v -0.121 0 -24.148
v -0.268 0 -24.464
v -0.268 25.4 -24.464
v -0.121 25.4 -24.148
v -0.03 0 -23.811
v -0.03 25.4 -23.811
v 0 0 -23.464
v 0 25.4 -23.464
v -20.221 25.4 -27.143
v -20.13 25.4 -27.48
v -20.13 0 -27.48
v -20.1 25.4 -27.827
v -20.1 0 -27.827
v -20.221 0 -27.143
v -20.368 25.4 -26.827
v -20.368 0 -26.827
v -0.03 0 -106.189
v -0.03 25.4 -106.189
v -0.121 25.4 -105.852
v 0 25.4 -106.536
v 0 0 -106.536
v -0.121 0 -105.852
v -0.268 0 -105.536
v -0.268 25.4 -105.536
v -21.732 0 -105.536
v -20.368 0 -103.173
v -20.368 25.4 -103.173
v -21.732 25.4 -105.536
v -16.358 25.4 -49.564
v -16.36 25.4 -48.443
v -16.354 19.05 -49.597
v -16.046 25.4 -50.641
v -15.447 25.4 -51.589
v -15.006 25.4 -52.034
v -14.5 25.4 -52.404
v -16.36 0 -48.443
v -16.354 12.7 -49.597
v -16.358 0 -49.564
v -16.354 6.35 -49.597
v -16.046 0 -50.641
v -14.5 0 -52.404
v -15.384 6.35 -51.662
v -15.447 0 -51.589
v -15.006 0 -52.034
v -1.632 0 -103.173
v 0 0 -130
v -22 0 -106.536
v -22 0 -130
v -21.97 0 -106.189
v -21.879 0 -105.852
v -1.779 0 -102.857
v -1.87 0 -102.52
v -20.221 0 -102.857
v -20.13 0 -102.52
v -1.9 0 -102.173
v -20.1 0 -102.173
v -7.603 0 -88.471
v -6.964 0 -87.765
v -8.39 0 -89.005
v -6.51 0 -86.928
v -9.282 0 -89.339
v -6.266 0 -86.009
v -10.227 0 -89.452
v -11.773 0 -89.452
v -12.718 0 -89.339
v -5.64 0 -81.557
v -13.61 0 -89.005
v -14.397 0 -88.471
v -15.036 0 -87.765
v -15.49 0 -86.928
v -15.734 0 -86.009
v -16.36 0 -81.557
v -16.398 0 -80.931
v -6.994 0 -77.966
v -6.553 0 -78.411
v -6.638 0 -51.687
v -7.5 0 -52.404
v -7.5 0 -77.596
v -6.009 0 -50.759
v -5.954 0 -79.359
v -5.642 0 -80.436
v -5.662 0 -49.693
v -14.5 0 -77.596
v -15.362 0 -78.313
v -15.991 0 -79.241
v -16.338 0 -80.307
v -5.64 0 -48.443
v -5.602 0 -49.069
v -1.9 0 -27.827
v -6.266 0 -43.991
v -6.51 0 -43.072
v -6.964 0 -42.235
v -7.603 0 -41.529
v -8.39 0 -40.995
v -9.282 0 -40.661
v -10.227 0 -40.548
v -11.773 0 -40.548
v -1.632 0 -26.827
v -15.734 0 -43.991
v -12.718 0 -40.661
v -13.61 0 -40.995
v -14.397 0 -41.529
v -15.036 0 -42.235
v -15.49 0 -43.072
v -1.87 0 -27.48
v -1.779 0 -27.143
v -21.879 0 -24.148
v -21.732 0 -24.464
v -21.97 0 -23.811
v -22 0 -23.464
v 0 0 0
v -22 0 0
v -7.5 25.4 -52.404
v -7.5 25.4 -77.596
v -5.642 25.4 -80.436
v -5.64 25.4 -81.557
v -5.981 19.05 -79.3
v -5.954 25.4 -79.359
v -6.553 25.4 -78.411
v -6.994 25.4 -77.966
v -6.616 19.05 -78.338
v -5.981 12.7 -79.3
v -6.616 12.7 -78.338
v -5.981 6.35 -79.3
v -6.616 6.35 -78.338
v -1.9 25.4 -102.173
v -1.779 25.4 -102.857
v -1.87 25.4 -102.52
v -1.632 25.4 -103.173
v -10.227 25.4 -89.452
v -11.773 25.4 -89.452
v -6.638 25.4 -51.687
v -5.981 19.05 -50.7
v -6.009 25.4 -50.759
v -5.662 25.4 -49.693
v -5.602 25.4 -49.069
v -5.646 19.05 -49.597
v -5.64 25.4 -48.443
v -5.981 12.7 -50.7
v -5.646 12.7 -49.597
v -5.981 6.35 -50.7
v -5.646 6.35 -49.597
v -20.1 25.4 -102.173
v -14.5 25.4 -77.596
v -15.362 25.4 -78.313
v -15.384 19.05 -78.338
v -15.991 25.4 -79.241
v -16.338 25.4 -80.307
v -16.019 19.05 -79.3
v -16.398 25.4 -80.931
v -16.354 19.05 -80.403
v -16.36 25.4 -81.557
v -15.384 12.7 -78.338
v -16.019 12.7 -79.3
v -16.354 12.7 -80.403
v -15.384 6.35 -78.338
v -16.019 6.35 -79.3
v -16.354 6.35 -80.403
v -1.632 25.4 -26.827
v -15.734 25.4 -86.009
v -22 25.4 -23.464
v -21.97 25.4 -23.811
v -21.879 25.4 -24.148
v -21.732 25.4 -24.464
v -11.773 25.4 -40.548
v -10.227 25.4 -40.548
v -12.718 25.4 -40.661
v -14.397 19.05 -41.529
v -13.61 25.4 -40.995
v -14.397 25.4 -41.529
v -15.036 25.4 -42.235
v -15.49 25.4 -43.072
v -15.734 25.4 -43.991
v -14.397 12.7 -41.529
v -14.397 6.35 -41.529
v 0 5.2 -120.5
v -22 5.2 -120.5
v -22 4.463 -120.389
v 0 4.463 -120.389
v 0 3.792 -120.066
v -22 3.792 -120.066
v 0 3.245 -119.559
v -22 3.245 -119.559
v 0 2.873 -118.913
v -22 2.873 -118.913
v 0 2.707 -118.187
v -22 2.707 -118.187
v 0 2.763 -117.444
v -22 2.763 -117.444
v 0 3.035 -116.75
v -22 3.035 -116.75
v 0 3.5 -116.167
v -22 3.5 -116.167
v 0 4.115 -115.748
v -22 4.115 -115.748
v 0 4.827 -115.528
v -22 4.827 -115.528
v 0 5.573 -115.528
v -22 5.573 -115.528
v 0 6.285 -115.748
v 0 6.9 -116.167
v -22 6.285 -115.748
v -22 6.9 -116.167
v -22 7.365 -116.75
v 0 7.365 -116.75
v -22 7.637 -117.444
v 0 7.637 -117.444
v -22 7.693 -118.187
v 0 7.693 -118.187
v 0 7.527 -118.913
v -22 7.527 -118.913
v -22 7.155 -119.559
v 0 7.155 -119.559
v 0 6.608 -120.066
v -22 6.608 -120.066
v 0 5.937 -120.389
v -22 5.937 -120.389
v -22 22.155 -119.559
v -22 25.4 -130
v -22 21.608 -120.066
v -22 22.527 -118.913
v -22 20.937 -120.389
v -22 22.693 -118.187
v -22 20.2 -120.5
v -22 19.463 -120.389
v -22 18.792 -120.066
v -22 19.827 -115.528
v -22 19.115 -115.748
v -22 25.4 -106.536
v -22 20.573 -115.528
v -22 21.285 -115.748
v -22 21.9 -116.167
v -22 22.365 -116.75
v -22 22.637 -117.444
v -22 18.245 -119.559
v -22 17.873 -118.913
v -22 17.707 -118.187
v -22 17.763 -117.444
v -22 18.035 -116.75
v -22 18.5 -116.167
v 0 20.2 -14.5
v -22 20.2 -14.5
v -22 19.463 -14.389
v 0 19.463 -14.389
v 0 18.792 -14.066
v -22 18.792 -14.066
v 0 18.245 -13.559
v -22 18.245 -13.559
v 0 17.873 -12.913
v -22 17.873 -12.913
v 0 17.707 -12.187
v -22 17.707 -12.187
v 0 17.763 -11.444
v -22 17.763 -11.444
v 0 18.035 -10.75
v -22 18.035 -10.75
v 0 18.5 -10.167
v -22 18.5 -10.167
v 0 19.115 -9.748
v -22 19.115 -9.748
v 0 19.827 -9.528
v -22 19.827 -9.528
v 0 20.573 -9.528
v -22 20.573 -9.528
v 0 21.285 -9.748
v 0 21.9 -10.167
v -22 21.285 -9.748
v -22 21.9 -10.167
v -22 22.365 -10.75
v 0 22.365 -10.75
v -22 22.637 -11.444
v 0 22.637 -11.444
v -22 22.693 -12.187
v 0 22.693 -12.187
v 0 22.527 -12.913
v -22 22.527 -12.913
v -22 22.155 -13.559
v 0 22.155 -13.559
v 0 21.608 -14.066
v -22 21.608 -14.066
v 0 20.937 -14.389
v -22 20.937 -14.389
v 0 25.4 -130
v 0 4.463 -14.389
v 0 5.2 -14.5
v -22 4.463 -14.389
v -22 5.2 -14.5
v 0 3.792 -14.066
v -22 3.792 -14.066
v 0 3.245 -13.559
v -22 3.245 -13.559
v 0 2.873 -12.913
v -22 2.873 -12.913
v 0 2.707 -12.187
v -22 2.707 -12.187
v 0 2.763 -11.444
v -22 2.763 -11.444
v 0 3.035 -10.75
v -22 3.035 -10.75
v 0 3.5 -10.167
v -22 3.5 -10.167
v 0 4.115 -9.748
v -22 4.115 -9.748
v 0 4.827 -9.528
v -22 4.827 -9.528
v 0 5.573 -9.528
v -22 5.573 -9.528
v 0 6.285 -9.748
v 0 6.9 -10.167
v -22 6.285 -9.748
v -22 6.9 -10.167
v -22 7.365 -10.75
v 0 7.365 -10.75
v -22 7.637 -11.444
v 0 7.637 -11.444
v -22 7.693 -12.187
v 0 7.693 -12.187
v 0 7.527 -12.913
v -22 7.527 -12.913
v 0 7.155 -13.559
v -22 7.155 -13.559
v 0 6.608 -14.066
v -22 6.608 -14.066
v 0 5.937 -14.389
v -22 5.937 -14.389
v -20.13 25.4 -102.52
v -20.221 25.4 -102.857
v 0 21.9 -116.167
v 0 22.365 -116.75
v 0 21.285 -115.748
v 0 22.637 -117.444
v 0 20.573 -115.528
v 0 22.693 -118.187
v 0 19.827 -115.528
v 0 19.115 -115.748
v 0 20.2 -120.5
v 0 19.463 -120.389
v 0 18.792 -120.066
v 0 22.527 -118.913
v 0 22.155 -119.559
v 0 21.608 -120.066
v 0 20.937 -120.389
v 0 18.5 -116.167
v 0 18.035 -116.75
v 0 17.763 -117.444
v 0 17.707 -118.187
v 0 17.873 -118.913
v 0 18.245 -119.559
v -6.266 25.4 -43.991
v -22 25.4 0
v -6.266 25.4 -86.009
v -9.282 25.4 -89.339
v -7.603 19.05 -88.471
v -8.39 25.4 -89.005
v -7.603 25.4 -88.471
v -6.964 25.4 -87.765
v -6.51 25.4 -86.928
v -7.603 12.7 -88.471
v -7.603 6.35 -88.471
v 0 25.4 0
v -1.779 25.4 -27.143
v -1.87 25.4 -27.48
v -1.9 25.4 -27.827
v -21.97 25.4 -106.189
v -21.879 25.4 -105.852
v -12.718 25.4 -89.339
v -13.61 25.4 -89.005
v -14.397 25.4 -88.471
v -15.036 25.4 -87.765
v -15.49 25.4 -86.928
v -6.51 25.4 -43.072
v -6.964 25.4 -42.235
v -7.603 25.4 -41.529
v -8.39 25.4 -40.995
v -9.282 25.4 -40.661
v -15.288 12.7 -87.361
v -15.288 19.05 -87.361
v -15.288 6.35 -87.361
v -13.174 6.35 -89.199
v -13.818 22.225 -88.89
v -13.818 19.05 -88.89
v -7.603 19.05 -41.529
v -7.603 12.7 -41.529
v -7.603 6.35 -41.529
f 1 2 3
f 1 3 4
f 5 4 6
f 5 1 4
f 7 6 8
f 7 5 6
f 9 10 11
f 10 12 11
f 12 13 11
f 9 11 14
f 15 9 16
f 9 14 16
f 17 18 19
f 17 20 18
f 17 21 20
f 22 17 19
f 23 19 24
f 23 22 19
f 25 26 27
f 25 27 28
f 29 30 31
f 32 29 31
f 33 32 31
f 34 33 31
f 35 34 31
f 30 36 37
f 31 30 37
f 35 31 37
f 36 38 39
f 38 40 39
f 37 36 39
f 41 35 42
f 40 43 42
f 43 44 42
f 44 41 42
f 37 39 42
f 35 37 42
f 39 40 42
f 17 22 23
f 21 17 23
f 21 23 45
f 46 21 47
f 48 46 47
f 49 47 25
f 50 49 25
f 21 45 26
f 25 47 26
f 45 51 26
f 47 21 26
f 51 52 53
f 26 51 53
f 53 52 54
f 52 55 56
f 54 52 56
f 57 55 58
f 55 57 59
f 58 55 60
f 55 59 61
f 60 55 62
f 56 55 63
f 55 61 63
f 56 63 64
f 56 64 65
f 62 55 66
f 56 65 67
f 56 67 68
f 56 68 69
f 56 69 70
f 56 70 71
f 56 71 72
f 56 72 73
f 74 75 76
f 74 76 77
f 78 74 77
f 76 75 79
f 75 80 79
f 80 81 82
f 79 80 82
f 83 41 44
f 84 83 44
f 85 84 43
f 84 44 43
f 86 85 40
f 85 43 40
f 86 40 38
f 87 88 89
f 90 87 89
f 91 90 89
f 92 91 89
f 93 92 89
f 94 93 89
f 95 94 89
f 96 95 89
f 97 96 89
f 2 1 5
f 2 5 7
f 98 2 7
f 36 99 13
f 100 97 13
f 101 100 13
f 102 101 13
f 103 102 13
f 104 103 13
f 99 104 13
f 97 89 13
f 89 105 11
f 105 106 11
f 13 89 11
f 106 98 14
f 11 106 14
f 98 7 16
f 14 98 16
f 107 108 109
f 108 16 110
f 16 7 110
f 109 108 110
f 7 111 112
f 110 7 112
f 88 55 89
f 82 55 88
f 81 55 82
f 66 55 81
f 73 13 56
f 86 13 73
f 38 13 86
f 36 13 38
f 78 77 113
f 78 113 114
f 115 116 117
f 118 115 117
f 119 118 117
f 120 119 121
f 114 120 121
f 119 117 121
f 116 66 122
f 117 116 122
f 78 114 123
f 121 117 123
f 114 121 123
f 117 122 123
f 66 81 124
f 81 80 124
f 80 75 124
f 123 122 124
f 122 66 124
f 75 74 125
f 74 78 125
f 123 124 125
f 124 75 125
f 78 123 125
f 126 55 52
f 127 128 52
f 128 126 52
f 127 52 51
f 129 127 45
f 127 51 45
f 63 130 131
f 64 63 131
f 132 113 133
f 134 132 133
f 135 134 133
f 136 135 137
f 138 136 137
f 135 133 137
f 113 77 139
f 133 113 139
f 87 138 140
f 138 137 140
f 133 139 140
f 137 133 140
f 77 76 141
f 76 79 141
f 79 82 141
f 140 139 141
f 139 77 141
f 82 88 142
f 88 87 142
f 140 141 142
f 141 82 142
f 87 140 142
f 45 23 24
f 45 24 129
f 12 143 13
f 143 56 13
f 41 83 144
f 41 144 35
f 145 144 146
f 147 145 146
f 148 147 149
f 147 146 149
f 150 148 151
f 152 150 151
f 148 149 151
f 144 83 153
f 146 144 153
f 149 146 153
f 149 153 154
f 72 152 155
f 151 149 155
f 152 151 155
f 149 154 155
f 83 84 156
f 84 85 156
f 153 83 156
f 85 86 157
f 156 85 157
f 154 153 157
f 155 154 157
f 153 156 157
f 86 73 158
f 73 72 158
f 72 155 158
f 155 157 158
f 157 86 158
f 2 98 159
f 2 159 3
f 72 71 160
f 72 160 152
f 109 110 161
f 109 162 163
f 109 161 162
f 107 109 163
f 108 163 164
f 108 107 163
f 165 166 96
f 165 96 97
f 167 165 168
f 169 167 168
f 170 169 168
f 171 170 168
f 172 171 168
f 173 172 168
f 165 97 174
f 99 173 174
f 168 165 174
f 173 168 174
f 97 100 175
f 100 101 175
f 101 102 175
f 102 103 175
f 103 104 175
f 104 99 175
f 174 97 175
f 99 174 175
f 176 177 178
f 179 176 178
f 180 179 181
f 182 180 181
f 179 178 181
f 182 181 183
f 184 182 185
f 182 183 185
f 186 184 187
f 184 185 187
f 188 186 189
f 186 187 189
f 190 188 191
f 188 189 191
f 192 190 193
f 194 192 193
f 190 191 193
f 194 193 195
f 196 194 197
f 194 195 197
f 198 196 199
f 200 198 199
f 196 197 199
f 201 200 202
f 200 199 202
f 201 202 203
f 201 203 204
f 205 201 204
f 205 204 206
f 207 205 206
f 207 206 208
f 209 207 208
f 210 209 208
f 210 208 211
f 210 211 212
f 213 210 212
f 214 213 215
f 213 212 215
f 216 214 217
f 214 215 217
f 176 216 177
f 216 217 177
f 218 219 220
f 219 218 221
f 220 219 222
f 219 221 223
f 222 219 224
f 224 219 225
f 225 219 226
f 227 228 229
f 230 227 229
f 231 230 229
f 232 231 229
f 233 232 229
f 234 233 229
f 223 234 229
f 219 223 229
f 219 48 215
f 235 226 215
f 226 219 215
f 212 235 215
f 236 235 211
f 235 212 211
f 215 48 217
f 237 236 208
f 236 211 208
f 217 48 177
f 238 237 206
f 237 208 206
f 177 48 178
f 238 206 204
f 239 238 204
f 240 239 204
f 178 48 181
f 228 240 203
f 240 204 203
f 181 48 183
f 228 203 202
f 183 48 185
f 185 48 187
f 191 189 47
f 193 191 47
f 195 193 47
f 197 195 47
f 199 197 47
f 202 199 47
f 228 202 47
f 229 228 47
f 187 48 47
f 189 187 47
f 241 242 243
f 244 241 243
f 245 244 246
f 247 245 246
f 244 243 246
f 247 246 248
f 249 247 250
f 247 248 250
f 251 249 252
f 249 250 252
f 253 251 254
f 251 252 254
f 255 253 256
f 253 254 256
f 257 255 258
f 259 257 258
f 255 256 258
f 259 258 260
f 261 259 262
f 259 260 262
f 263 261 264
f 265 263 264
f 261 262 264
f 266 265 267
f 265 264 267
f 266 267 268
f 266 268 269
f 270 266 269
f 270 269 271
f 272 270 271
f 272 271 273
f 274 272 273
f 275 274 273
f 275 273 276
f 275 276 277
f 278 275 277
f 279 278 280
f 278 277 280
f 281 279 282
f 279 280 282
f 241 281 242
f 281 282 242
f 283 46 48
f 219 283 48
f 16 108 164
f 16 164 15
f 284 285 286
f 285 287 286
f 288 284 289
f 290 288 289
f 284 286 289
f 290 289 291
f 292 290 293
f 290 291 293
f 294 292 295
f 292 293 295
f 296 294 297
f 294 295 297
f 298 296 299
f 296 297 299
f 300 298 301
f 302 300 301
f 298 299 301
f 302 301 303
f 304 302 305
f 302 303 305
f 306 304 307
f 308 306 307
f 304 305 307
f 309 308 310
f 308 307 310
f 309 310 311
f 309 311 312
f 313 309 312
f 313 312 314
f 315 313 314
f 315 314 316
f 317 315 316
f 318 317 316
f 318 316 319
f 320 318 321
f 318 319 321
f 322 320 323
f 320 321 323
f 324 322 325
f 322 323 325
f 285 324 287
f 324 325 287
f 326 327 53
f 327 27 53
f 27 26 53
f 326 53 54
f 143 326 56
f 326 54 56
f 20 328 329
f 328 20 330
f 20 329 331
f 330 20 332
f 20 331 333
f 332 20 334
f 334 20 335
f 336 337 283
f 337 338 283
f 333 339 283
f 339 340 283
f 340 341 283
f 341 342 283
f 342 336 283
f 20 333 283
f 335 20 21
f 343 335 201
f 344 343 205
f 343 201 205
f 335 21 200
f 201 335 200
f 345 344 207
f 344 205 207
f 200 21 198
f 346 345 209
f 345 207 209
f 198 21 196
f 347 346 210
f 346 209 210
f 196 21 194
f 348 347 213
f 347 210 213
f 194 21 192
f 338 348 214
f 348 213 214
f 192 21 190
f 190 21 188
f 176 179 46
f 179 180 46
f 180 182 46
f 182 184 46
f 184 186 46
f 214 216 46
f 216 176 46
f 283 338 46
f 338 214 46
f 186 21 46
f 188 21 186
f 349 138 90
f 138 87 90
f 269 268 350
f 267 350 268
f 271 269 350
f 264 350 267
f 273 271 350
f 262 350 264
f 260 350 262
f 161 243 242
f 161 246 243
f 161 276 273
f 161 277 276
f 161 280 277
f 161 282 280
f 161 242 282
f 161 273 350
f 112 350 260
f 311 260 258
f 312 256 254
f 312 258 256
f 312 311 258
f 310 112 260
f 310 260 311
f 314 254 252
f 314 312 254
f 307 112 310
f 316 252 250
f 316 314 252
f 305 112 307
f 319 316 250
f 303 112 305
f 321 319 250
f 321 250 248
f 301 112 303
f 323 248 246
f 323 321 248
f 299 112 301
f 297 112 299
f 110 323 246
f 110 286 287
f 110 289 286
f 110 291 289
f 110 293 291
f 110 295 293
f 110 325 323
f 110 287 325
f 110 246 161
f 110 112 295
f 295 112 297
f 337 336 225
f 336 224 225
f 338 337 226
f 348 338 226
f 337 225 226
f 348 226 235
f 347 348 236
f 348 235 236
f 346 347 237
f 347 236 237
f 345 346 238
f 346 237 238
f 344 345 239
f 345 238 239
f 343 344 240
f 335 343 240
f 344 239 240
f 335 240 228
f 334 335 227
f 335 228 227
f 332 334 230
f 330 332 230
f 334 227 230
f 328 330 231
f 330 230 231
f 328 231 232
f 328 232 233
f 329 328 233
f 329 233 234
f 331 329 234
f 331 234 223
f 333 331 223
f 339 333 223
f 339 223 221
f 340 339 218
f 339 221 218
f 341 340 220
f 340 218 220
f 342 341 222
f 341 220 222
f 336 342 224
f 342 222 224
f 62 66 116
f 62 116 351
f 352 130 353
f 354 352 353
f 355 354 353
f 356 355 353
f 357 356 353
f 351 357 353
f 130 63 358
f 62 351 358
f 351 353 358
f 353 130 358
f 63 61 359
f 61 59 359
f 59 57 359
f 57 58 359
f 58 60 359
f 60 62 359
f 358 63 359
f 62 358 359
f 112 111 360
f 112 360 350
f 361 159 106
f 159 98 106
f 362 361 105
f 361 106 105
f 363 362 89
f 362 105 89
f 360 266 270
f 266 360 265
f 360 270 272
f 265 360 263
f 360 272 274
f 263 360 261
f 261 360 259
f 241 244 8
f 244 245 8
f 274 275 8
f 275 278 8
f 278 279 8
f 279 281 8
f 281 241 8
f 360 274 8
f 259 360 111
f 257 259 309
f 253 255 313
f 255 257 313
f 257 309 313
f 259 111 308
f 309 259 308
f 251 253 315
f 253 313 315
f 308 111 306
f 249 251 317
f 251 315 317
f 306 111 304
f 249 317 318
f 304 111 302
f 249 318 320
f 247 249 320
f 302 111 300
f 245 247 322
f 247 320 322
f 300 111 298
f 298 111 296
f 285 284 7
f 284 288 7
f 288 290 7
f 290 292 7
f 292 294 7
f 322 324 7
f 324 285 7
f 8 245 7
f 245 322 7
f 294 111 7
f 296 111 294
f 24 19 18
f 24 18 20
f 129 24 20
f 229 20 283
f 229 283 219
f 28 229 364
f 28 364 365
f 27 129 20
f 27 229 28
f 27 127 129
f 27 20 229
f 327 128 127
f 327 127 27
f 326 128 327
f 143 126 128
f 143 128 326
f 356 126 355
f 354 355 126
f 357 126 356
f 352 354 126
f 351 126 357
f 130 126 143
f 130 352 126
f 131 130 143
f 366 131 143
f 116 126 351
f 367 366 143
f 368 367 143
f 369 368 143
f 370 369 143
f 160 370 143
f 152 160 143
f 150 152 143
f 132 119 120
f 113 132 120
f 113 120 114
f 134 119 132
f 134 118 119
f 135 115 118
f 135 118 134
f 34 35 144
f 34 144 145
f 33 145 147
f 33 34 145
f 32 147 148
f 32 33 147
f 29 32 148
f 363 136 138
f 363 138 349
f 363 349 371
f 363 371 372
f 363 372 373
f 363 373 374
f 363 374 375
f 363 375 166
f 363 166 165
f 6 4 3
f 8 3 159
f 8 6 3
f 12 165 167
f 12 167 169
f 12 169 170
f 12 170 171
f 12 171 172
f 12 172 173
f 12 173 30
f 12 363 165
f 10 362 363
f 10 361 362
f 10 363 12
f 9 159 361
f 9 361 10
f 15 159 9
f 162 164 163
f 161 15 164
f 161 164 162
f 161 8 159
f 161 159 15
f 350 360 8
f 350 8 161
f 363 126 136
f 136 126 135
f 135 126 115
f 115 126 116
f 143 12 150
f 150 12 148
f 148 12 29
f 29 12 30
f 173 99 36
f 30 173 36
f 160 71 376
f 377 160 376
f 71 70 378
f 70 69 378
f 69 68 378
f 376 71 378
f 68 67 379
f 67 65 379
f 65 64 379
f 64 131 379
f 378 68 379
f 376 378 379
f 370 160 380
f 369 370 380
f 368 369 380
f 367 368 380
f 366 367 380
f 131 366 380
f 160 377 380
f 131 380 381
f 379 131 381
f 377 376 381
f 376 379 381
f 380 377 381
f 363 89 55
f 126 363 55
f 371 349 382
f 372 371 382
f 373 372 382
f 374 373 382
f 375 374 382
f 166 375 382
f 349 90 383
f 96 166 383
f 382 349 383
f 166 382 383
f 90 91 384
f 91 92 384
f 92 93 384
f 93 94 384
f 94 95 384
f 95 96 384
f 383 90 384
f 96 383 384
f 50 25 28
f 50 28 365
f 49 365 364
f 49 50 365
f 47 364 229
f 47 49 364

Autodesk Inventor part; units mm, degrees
ref_plane "YZ Plane" through (0, 0, 0) normal (1, 0, 0) x (0, 1, 0)
ref_plane "XZ Plane" through (0, 0, 0) normal (0, 1, 0) x (-1, 0, 0)
ref_plane "XY Plane" through (0, 0, 0) normal (0, 0, 1) x (1, 0, 0)
sketch "Esboço1" plane through (0, 0, 0) normal (0, 1, 0) x (-1, 0, 0)
  line L0 (0, 0) -> (22, 0)
  line L1 (22, 0) -> (22, -23.4641)
  line L2 (22, -24) -> (25.6764, -24) construction
  line L3 (0, 0) -> (0, -23.4641)
  line L4 (1.9, -27.8268) -> (1.9, -102.1732)
  line L5 (0, -106.5359) -> (0, -130)
  line L6 (0, -130) -> (22, -130)
  line L7 (22, -130) -> (22, -106.5359)
  line L8 (20.1, -102.1732) -> (20.1, -27.8268)
  line L9 (21.7321, -24.4641) -> (20.3679, -26.8268)
  line L10 (1.6321, -26.8268) -> (0.2679, -24.4641)
  line L11 (20.3679, -103.1732) -> (21.7321, -105.5359)
  line L12 (0.2679, -105.5359) -> (1.6321, -103.1732)
  arc A0 (21.7321, -24.4641) -> (22, -23.4641) centre (20, -23.4641) ccw
  arc A1 (20.3679, -26.8268) -> (20.1, -27.8268) centre (22.1, -27.8268) ccw
  arc A2 (1.9, -27.8268) -> (1.6321, -26.8268) centre (-0.1, -27.8268) ccw
  arc A3 (0, -23.4641) -> (0.2679, -24.4641) centre (2, -23.4641) ccw
  arc A4 (22, -106.5359) -> (21.7321, -105.5359) centre (20, -106.5359) ccw
  arc A5 (20.1, -102.1732) -> (20.3679, -103.1732) centre (22.1, -102.1732) ccw
  arc A6 (1.6321, -103.1732) -> (1.9, -102.1732) centre (-0.1, -102.1732) ccw
  arc A7 (0.2679, -105.5359) -> (0, -106.5359) centre (2, -106.5359) ccw
  line L13 (7.5, -52.4035) -> (7.5, -77.5965)
  spline S0 degree 3 poles (7.5, -52.4035) (7.1712, -52.2005) (6.8736, -51.9509) (6.3593, -51.374) (6.1453, -51.0498) (5.8168, -50.3503) (5.704, -49.9786) (5.5886, -49.2144) (5.5866, -48.826) (5.6404, -48.4433) knots -0.463747 -0.463747 -0.463747 -0.463747 -0.347807 -0.347807 -0.231874 -0.231874 -0.115941 -0.115941 -0.000001 -0.000001 -0.000001 -0.000001
  line L14 (5.6404, -48.4433) -> (6.2661, -43.9914)
  spline S1 degree 3 poles (6.2661, -43.9914) (6.3326, -43.5177) (6.4837, -43.0598) (6.9401, -42.2191) (7.2419, -41.8431) (7.9639, -41.2155) (8.3783, -40.9689) (9.2743, -40.6339) (9.7488, -40.5481) (10.2271, -40.5481) knots -0.574004 -0.574004 -0.574004 -0.574004 -0.430503 -0.430503 -0.287003 -0.287003 -0.143502 -0.143502 -0.000001 -0.000001 -0.000001 -0.000001
  line L15 (10.2271, -40.5481) -> (11.7729, -40.5481)
  spline S2 degree 3 poles (11.7729, -40.5481) (12.2512, -40.5481) (12.7257, -40.6339) (13.6217, -40.9689) (14.0361, -41.2155) (14.7581, -41.8431) (15.0599, -42.2191) (15.5163, -43.0598) (15.6674, -43.5177) (15.7339, -43.9914) knots -0.574004 -0.574004 -0.574004 -0.574004 -0.430503 -0.430503 -0.287003 -0.287003 -0.143502 -0.143502 -0.000001 -0.000001 -0.000001 -0.000001
  line L16 (15.7339, -43.9914) -> (16.3596, -48.4433)
  spline S3 degree 3 poles (16.3596, -48.4433) (16.4134, -48.826) (16.4114, -49.2144) (16.296, -49.9786) (16.1832, -50.3503) (15.8547, -51.0498) (15.6407, -51.374) (15.1264, -51.9509) (14.8288, -52.2005) (14.5, -52.4035) knots -0.463747 -0.463747 -0.463747 -0.463747 -0.347807 -0.347807 -0.231874 -0.231874 -0.115941 -0.115941 -0.000001 -0.000001 -0.000001 -0.000001
  line L17 (14.5, -77.5965) -> (14.5, -52.4035)
  spline S4 degree 3 poles (14.5, -77.5965) (14.8288, -77.7995) (15.1264, -78.0491) (15.6407, -78.626) (15.8547, -78.9502) (16.1832, -79.6497) (16.296, -80.0214) (16.4114, -80.7856) (16.4134, -81.174) (16.3596, -81.5567) knots -0.463747 -0.463747 -0.463747 -0.463747 -0.347807 -0.347807 -0.231874 -0.231874 -0.115941 -0.115941 -0.000001 -0.000001 -0.000001 -0.000001
  line L18 (15.7339, -86.0086) -> (16.3596, -81.5567)
  spline S5 degree 3 poles (15.7339, -86.0086) (15.6674, -86.4823) (15.5163, -86.9402) (15.0599, -87.7809) (14.7581, -88.1569) (14.0361, -88.7845) (13.6217, -89.0311) (12.7257, -89.3661) (12.2512, -89.4519) (11.7729, -89.4519) knots -0.574004 -0.574004 -0.574004 -0.574004 -0.430503 -0.430503 -0.287003 -0.287003 -0.143502 -0.143502 -0.000001 -0.000001 -0.000001 -0.000001
  spline S6 degree 3 poles (10.2271, -89.4519) (9.7488, -89.4519) (9.2743, -89.3661) (8.3783, -89.0311) (7.9639, -88.7845) (7.2419, -88.1569) (6.9401, -87.7809) (6.4837, -86.9402) (6.3326, -86.4823) (6.2661, -86.0086) knots -0.574004 -0.574004 -0.574004 -0.574004 -0.430503 -0.430503 -0.287003 -0.287003 -0.143502 -0.143502 -0.000001 -0.000001 -0.000001 -0.000001
  line L19 (10.2271, -89.4519) -> (11.7729, -89.4519)
  line L20 (5.6404, -81.5567) -> (6.2661, -86.0086)
  spline S7 degree 3 poles (5.6404, -81.5567) (5.5866, -81.174) (5.5886, -80.7856) (5.704, -80.0214) (5.8168, -79.6497) (6.1453, -78.9502) (6.3593, -78.626) (6.8736, -78.0491) (7.1712, -77.7995) (7.5, -77.5965) knots -0.463747 -0.463747 -0.463747 -0.463747 -0.347807 -0.347807 -0.231874 -0.231874 -0.115941 -0.115941 -0.000001 -0.000001 -0.000001 -0.000001
  point P0 (20.1, -27.2909)
  point P1 (0, -24)
  point P2 (1.9, -27.2909)
  point P3 (0, -106)
  point P4 (22, -106)
  point P5 (20.1, -102.7091)
  point P6 (11, -130)
  point P7 (11, -89.4519)
  point P8 (11, -40.5481)
  point P9 (20.1, -65)
  point P10 (14.5, -65)
  dimension "d0" = 22
  dimension "d1" = 24
  dimension "d4" = 3.8
  dimension "d6" = 3.8
  dimension "d7" = 24
  dimension "d8" = 18.2
  dimension "d10" = 0
  dimension "d11" = 130
  dimension "d12" = 1.9
  dimension "d13" = 2
  dimension "d14" = 2
  dimension "d38" = 7
  dimension "d39" = 7
  dimension "d40" = 4.4957
  dimension "d41" = 4.4957
  dimension "d42" = 4.4519
  dimension "d43" = 0.6257
  dimension "d44" = 172
  dimension "d45" = 1.5457
  dimension "d46" = 1.5457
  dimension "d47" = 0.6257
  dimension "d48" = 4.4519
  dimension "d49" = 3.9611
  dimension "d50" = 3.4433
  dimension "d51" = 9.4679
  dimension "d52" = 3.9611
  dimension "d53" = 3.9602
  dimension "d54" = 1.8596
  dimension "d55" = 4.4519
  dimension "d56" = 3.9602
  dimension "d57" = 3.9602
  dimension "d58" = 4.3751
  dimension "d59" = 1.8596
  dimension "d60" = 3.9611
  dimension "d61" = 3.9611
  dimension "d62" = 3.4433
  dimension "d63" = 3.4433
  dimension "d64" = 0
  dimension "d65" = 48.9038
  dimension "d67" = 0
extrude "Extrusão1" add sketch "Esboço1" along normal blind 25.4
sketch "Esboço2" plane through (0, 0, 0) normal (1, 0, 0) x (0, 0, -1)
  line L0 (0, 0) -> (0, 25.4) projected
  line L1 (0, 25.4) -> (23.4641, 25.4) projected
  line L2 (130, 0) -> (130, 25.4) projected
  line L3 (106.5359, 25.4) -> (130, 25.4) projected
  point P0 (12, 20.2)
  point P1 (12, 5.2)
  point P2 (118, 20.2)
  point P3 (118, 5.2)
  point P4 (11.7321, 25.4)
  dimension "d70" = 15
  dimension "d72" = 25.4
  dimension "d73" = 5.2
  dimension "d74" = 0
  dimension "d75" = 12
  dimension "d76" = 15
  dimension "d77" = 12
  dimension "d78" = 0
  dimension "d79" = 5.2
hole "Furo1" at (0, 20.2, -12) at (0, 5.2, -12) at (0, 20.2, -118) at (0, 5.2, -118) direction (-1, 0, 0) diameter 5 end through all
equation "\"d7\" = d1"
equation "\"d12\" = -0.5 * d8 + 0.5 * d0"
equation "\"d73\" = -0.5 * d70 + 0.5 * d72"
equation "\"d76\" = d70"
equation "\"d77\" = d75"
equation "\"d79\" = d73"
equation "\"d85\" = Espessura"
equation "\"Raio_vergadura\" = Espessura"
equation "\"Largura_alívio_de_vergadura\" = Espessura"
equation "\"Profundidade_alívio_de_vergadura\" = 0.5 * Espessura"
equation "\"Tamanho_alívio_de_dobra\" = 4 * Espessura"
equation "\"Remanescente_mínimo\" = 2 * Espessura"
equation "\"Raiodetransição\" = Raio_vergadura"
equation "\"Tamanho_de_raio_de_Jacobi\" = Raio_vergadura"
equation "\"TamanhoFolga\" = Espessura"
equation "\"Espessura\" = 0.5"
properties part number "Célula de carga" material "Alumínio 6061"
